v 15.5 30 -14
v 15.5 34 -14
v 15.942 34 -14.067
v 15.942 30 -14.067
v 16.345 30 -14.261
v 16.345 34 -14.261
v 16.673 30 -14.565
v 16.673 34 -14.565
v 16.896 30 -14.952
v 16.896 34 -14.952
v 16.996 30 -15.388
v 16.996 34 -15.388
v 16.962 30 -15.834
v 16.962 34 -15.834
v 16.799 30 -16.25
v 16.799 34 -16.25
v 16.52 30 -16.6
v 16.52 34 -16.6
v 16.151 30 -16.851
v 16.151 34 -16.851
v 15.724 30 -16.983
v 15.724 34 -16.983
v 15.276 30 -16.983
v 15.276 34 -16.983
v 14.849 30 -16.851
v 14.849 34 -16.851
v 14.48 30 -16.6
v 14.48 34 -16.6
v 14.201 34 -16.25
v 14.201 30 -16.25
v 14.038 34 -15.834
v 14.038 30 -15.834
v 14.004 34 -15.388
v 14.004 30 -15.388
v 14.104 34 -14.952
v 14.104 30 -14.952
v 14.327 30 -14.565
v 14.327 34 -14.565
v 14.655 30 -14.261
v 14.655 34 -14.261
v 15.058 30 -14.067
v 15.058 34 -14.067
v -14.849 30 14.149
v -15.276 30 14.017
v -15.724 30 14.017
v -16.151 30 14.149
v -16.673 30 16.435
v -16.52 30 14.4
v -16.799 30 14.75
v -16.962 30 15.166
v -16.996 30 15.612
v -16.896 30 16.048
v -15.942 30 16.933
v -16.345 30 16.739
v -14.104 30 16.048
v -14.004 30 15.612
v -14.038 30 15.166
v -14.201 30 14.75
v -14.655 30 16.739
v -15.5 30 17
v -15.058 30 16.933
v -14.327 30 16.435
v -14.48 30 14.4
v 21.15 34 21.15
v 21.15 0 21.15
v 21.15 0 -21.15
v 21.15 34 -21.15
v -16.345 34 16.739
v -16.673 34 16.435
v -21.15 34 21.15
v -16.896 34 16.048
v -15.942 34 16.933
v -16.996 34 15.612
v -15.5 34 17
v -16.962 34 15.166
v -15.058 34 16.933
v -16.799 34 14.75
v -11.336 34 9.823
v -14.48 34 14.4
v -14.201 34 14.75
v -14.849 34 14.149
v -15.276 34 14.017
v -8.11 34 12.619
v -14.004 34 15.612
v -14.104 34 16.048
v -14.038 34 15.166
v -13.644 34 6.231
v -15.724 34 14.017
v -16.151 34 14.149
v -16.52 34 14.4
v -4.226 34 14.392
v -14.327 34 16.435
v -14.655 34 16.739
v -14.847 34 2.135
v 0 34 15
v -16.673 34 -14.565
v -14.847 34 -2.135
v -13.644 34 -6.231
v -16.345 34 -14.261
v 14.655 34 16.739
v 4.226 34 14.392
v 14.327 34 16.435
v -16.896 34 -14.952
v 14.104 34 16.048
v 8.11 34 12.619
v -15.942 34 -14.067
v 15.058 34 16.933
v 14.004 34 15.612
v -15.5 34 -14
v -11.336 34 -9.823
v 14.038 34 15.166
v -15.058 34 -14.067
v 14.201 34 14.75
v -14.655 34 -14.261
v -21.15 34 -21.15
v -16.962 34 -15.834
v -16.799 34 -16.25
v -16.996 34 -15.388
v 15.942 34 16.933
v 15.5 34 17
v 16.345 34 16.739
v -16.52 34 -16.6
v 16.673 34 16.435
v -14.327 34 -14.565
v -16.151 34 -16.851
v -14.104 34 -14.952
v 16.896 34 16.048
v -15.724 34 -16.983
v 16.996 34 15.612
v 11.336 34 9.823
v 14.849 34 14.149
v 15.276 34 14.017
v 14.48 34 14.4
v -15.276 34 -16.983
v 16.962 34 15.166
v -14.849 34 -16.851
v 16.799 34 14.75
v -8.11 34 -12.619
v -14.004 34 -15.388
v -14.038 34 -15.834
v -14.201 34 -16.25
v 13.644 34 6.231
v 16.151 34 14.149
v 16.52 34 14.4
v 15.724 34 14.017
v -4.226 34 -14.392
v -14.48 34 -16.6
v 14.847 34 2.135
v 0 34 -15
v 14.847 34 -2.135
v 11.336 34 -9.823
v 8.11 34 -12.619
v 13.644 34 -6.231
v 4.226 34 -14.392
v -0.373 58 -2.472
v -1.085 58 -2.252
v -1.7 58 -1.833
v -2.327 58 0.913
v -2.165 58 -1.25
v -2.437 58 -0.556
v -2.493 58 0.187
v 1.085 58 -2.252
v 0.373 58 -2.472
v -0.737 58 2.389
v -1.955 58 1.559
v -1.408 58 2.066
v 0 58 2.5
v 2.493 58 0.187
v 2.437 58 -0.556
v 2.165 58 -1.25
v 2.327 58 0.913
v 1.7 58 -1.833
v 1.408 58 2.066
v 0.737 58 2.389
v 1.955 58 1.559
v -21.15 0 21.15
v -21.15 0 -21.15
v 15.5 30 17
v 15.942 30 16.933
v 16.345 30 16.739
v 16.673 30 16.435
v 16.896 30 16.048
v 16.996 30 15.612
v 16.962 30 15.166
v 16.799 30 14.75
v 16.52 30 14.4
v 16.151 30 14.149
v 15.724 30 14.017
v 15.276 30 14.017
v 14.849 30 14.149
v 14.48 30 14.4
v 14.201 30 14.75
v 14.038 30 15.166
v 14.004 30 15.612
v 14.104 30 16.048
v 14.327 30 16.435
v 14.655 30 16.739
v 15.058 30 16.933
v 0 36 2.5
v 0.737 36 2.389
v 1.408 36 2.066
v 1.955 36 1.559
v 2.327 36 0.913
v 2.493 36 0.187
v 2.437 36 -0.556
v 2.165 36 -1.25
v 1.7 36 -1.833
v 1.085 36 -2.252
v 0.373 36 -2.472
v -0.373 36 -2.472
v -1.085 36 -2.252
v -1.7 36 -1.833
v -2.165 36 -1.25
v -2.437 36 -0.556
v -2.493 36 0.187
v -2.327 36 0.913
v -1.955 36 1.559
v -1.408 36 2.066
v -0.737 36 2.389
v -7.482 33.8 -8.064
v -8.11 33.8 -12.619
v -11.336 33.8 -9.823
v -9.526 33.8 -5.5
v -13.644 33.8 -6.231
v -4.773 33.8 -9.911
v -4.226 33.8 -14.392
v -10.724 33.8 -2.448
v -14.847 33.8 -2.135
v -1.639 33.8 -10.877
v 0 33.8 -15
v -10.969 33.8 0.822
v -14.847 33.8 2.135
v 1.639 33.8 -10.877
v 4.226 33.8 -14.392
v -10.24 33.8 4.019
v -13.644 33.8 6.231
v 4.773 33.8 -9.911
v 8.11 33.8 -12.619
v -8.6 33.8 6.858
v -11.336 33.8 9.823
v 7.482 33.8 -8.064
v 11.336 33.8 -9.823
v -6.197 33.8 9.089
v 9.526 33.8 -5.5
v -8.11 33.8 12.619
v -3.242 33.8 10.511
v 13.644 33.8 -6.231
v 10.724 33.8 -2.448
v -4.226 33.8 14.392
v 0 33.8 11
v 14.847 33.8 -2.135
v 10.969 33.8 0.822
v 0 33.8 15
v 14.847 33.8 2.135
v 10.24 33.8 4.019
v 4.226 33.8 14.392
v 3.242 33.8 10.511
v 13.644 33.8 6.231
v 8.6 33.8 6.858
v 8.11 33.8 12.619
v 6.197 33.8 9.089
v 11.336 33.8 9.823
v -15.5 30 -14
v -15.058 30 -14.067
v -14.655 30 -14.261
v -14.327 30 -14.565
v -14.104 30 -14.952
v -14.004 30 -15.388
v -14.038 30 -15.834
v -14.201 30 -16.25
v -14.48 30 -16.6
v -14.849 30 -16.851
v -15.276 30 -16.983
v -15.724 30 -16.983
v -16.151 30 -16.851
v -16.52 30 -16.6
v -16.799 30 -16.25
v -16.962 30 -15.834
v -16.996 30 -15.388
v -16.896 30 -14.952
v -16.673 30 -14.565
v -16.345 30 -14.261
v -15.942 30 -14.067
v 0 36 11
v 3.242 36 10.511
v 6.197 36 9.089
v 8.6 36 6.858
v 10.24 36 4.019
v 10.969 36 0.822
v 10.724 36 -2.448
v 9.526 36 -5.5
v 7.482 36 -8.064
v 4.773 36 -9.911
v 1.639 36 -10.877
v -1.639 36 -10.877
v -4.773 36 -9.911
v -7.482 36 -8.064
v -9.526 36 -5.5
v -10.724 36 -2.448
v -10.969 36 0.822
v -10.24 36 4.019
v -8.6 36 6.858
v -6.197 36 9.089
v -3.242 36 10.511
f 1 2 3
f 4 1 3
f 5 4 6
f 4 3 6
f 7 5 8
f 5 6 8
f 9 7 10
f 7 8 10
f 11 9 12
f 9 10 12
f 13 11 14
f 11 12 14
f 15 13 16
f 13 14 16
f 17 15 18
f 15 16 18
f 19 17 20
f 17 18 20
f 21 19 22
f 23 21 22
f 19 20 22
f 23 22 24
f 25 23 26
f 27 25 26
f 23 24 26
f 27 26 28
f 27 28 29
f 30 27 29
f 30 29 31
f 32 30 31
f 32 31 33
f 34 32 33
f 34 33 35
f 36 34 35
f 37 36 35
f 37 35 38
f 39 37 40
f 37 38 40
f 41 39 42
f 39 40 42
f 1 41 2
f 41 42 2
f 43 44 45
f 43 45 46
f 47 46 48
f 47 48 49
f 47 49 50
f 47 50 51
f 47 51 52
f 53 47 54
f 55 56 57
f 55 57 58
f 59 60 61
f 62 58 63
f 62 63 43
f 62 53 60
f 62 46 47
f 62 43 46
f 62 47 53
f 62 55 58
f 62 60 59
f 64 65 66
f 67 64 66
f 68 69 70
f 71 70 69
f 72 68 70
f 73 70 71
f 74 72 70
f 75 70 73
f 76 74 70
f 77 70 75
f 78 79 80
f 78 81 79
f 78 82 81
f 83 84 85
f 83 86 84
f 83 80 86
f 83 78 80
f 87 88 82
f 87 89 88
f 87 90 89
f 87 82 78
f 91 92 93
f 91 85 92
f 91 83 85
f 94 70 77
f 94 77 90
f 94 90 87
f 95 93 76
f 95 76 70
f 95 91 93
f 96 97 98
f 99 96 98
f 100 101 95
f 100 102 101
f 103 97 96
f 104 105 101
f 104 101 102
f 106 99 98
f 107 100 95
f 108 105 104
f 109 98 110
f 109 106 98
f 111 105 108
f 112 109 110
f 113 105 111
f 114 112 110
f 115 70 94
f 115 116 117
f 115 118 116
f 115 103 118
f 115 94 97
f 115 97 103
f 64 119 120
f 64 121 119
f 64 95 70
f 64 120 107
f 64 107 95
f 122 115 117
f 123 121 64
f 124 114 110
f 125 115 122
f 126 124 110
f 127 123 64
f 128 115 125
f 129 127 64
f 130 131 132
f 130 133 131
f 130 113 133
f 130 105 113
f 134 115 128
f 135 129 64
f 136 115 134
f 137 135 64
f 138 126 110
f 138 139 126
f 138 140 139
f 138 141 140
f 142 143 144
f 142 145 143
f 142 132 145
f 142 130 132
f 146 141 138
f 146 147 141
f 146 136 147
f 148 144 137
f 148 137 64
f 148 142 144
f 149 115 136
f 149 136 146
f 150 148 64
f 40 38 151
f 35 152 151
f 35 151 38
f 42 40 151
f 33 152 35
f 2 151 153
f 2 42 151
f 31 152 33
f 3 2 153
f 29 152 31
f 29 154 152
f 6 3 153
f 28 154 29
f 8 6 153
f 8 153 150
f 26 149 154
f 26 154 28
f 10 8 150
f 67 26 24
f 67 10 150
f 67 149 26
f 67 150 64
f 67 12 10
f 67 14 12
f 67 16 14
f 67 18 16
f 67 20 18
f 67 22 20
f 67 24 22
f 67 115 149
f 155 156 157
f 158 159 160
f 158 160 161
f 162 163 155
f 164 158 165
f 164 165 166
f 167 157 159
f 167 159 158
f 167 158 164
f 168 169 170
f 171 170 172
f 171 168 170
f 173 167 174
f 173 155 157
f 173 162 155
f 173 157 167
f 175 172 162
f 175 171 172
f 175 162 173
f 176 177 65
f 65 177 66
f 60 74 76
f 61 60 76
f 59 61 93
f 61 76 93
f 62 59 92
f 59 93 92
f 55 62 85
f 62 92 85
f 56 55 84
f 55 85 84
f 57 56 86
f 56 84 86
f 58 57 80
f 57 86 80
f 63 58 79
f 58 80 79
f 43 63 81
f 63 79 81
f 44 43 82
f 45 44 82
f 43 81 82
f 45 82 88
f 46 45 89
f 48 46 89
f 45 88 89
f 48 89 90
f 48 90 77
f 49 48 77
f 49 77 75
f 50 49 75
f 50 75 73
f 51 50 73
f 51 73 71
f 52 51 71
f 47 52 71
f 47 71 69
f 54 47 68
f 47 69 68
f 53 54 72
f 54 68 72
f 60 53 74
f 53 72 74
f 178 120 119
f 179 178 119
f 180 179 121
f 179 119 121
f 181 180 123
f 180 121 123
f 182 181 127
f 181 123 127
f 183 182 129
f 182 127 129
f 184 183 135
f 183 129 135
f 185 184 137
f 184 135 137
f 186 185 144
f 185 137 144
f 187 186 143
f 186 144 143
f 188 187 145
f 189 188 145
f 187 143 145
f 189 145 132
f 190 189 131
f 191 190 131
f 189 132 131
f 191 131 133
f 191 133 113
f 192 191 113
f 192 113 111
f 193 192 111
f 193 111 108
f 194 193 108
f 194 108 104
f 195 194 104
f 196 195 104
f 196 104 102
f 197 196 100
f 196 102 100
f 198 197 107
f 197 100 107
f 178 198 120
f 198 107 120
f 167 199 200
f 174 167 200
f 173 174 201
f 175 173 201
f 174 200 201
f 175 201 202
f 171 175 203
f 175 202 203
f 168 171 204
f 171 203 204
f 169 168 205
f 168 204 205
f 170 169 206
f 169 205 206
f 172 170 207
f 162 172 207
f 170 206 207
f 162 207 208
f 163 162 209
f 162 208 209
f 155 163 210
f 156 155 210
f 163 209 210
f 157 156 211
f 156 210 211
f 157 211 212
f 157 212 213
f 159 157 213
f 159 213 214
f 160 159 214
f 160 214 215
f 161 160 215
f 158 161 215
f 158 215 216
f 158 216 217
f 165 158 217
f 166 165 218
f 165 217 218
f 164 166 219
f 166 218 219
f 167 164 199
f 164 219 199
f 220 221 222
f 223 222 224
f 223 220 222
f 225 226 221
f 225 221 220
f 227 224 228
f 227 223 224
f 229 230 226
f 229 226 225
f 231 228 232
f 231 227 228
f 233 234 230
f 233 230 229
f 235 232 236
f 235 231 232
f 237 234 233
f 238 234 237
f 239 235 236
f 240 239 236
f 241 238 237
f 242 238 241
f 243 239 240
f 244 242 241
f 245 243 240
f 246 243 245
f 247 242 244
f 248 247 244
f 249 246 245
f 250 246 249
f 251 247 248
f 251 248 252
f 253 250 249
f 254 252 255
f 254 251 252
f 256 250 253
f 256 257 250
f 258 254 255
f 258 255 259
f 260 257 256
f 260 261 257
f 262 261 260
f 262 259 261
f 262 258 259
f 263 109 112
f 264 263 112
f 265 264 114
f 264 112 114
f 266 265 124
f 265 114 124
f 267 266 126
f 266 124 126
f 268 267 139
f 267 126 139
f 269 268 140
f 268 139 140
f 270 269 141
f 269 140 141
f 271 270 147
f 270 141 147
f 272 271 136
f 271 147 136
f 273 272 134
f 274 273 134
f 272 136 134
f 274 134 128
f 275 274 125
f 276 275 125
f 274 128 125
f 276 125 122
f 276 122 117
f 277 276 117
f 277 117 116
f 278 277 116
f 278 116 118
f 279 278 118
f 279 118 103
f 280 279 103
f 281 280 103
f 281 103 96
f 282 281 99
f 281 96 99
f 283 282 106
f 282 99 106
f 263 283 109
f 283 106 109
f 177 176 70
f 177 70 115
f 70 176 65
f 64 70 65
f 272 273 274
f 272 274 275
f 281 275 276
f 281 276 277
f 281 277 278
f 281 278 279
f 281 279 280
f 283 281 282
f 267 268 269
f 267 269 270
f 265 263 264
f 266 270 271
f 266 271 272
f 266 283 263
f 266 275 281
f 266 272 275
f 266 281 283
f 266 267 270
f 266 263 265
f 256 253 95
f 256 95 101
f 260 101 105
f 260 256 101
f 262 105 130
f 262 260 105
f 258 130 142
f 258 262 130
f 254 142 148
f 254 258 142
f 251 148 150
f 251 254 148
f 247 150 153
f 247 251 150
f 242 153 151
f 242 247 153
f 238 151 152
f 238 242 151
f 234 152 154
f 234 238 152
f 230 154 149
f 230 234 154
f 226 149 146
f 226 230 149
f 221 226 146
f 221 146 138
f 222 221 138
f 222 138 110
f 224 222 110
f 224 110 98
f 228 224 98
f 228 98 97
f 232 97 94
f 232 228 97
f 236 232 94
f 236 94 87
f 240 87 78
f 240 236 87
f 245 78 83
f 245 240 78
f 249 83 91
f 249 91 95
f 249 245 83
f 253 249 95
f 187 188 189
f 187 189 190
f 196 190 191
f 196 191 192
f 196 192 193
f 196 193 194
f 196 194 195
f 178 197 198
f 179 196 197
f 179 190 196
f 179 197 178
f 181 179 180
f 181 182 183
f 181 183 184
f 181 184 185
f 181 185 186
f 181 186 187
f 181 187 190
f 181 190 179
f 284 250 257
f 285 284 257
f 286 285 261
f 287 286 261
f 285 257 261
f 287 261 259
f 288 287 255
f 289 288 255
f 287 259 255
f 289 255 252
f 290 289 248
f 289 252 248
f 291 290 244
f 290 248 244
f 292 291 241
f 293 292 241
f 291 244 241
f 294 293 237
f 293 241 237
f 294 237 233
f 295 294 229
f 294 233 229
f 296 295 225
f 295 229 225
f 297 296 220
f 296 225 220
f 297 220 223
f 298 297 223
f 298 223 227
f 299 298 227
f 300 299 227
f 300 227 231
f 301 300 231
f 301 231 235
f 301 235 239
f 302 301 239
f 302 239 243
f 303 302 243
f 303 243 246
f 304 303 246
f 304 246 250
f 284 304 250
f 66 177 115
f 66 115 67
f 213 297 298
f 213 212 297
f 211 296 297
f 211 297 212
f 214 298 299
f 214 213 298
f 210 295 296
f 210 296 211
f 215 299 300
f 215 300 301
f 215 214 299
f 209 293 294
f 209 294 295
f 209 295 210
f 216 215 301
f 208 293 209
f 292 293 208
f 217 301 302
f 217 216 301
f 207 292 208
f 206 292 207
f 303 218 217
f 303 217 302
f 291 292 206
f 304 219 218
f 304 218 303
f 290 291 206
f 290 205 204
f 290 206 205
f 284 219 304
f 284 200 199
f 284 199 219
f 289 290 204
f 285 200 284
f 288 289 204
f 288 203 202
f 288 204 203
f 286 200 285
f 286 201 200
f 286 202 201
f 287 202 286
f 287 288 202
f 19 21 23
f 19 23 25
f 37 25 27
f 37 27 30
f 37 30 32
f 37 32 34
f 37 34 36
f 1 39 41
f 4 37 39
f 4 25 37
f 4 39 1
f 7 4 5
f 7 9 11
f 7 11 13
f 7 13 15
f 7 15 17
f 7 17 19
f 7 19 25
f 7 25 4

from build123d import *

# Parameters (mm, degrees)
SKETCH1_W            = 42.3
SKETCH1_H            = 42.3
BODY_DEPTH           = 34
SKETCH2_R            = 1.5
MOUNTING_HOLES_DEPTH = 4
SKETCH3_R            = 11
CENTER_THING_DEPTH   = 2
SKETCH4_R            = 2.5
SHAFT_DEPTH          = 22
LARGE_DIVOT_START    = -0.2
SKETCH5_R            = 15
SKETCH5_R_2          = 11
LARGE_DIVOT_DEPTH    = 0.2


with BuildPart() as part:
    # Sketch1 → body (new body)
    with BuildSketch(Plane(origin=(0, 0, 0), x_dir=(1, 0, 0), z_dir=(0, 1, 0))):
        Rectangle(SKETCH1_W, SKETCH1_H)
    extrude(amount=BODY_DEPTH)

    # Sketch2 → mounting-holes (cut)
    with BuildSketch(Plane(origin=(0, 34, 0), x_dir=(1, 0, 0), z_dir=(0, 1, 0))):
        with Locations(Location((-15.5, 15.5, 0), (0, 0, 270))):
            Circle(SKETCH2_R)
        with Locations(Location((15.5, 15.5, 0), (0, 0, 270))):
            Circle(SKETCH2_R)
        with Locations(Location((15.5, -15.5, 0), (0, 0, 270))):
            Circle(SKETCH2_R)
        with Locations(Location((-15.5, -15.5, 0), (0, 0, 270))):
            Circle(SKETCH2_R)
    extrude(amount=-MOUNTING_HOLES_DEPTH, mode=Mode.SUBTRACT)

    # Sketch3 → center-thing (add)
    with BuildSketch(Plane(origin=(0, 34, 0), x_dir=(1, 0, 0), z_dir=(0, 1, 0))):
        with Locations(Location((0, 0, 0), (0, 0, 270))):
            Circle(SKETCH3_R)
    extrude(amount=CENTER_THING_DEPTH)

    # Sketch4 → shaft (add)
    with BuildSketch(Plane(origin=(0, 36, 0), x_dir=(1, 0, 0), z_dir=(0, 1, 0))):
        with Locations(Location((0, 0, 0), (0, 0, 270))):
            Circle(SKETCH4_R)
    extrude(amount=SHAFT_DEPTH)

    # Sketch5 → large-divot (cut)
    with BuildSketch(Plane(origin=(0, 34, 0), x_dir=(1, 0, 0), z_dir=(0, 1, 0)).offset(LARGE_DIVOT_START)):
        with Locations(Location((0, 0, 0), (0, 0, 270))):
            Circle(SKETCH5_R)
        with Locations(Location((0, 0, 0), (0, 0, 270))):
            Circle(SKETCH5_R_2, mode=Mode.SUBTRACT)
    extrude(amount=LARGE_DIVOT_DEPTH, mode=Mode.SUBTRACT)


solid = part.part
